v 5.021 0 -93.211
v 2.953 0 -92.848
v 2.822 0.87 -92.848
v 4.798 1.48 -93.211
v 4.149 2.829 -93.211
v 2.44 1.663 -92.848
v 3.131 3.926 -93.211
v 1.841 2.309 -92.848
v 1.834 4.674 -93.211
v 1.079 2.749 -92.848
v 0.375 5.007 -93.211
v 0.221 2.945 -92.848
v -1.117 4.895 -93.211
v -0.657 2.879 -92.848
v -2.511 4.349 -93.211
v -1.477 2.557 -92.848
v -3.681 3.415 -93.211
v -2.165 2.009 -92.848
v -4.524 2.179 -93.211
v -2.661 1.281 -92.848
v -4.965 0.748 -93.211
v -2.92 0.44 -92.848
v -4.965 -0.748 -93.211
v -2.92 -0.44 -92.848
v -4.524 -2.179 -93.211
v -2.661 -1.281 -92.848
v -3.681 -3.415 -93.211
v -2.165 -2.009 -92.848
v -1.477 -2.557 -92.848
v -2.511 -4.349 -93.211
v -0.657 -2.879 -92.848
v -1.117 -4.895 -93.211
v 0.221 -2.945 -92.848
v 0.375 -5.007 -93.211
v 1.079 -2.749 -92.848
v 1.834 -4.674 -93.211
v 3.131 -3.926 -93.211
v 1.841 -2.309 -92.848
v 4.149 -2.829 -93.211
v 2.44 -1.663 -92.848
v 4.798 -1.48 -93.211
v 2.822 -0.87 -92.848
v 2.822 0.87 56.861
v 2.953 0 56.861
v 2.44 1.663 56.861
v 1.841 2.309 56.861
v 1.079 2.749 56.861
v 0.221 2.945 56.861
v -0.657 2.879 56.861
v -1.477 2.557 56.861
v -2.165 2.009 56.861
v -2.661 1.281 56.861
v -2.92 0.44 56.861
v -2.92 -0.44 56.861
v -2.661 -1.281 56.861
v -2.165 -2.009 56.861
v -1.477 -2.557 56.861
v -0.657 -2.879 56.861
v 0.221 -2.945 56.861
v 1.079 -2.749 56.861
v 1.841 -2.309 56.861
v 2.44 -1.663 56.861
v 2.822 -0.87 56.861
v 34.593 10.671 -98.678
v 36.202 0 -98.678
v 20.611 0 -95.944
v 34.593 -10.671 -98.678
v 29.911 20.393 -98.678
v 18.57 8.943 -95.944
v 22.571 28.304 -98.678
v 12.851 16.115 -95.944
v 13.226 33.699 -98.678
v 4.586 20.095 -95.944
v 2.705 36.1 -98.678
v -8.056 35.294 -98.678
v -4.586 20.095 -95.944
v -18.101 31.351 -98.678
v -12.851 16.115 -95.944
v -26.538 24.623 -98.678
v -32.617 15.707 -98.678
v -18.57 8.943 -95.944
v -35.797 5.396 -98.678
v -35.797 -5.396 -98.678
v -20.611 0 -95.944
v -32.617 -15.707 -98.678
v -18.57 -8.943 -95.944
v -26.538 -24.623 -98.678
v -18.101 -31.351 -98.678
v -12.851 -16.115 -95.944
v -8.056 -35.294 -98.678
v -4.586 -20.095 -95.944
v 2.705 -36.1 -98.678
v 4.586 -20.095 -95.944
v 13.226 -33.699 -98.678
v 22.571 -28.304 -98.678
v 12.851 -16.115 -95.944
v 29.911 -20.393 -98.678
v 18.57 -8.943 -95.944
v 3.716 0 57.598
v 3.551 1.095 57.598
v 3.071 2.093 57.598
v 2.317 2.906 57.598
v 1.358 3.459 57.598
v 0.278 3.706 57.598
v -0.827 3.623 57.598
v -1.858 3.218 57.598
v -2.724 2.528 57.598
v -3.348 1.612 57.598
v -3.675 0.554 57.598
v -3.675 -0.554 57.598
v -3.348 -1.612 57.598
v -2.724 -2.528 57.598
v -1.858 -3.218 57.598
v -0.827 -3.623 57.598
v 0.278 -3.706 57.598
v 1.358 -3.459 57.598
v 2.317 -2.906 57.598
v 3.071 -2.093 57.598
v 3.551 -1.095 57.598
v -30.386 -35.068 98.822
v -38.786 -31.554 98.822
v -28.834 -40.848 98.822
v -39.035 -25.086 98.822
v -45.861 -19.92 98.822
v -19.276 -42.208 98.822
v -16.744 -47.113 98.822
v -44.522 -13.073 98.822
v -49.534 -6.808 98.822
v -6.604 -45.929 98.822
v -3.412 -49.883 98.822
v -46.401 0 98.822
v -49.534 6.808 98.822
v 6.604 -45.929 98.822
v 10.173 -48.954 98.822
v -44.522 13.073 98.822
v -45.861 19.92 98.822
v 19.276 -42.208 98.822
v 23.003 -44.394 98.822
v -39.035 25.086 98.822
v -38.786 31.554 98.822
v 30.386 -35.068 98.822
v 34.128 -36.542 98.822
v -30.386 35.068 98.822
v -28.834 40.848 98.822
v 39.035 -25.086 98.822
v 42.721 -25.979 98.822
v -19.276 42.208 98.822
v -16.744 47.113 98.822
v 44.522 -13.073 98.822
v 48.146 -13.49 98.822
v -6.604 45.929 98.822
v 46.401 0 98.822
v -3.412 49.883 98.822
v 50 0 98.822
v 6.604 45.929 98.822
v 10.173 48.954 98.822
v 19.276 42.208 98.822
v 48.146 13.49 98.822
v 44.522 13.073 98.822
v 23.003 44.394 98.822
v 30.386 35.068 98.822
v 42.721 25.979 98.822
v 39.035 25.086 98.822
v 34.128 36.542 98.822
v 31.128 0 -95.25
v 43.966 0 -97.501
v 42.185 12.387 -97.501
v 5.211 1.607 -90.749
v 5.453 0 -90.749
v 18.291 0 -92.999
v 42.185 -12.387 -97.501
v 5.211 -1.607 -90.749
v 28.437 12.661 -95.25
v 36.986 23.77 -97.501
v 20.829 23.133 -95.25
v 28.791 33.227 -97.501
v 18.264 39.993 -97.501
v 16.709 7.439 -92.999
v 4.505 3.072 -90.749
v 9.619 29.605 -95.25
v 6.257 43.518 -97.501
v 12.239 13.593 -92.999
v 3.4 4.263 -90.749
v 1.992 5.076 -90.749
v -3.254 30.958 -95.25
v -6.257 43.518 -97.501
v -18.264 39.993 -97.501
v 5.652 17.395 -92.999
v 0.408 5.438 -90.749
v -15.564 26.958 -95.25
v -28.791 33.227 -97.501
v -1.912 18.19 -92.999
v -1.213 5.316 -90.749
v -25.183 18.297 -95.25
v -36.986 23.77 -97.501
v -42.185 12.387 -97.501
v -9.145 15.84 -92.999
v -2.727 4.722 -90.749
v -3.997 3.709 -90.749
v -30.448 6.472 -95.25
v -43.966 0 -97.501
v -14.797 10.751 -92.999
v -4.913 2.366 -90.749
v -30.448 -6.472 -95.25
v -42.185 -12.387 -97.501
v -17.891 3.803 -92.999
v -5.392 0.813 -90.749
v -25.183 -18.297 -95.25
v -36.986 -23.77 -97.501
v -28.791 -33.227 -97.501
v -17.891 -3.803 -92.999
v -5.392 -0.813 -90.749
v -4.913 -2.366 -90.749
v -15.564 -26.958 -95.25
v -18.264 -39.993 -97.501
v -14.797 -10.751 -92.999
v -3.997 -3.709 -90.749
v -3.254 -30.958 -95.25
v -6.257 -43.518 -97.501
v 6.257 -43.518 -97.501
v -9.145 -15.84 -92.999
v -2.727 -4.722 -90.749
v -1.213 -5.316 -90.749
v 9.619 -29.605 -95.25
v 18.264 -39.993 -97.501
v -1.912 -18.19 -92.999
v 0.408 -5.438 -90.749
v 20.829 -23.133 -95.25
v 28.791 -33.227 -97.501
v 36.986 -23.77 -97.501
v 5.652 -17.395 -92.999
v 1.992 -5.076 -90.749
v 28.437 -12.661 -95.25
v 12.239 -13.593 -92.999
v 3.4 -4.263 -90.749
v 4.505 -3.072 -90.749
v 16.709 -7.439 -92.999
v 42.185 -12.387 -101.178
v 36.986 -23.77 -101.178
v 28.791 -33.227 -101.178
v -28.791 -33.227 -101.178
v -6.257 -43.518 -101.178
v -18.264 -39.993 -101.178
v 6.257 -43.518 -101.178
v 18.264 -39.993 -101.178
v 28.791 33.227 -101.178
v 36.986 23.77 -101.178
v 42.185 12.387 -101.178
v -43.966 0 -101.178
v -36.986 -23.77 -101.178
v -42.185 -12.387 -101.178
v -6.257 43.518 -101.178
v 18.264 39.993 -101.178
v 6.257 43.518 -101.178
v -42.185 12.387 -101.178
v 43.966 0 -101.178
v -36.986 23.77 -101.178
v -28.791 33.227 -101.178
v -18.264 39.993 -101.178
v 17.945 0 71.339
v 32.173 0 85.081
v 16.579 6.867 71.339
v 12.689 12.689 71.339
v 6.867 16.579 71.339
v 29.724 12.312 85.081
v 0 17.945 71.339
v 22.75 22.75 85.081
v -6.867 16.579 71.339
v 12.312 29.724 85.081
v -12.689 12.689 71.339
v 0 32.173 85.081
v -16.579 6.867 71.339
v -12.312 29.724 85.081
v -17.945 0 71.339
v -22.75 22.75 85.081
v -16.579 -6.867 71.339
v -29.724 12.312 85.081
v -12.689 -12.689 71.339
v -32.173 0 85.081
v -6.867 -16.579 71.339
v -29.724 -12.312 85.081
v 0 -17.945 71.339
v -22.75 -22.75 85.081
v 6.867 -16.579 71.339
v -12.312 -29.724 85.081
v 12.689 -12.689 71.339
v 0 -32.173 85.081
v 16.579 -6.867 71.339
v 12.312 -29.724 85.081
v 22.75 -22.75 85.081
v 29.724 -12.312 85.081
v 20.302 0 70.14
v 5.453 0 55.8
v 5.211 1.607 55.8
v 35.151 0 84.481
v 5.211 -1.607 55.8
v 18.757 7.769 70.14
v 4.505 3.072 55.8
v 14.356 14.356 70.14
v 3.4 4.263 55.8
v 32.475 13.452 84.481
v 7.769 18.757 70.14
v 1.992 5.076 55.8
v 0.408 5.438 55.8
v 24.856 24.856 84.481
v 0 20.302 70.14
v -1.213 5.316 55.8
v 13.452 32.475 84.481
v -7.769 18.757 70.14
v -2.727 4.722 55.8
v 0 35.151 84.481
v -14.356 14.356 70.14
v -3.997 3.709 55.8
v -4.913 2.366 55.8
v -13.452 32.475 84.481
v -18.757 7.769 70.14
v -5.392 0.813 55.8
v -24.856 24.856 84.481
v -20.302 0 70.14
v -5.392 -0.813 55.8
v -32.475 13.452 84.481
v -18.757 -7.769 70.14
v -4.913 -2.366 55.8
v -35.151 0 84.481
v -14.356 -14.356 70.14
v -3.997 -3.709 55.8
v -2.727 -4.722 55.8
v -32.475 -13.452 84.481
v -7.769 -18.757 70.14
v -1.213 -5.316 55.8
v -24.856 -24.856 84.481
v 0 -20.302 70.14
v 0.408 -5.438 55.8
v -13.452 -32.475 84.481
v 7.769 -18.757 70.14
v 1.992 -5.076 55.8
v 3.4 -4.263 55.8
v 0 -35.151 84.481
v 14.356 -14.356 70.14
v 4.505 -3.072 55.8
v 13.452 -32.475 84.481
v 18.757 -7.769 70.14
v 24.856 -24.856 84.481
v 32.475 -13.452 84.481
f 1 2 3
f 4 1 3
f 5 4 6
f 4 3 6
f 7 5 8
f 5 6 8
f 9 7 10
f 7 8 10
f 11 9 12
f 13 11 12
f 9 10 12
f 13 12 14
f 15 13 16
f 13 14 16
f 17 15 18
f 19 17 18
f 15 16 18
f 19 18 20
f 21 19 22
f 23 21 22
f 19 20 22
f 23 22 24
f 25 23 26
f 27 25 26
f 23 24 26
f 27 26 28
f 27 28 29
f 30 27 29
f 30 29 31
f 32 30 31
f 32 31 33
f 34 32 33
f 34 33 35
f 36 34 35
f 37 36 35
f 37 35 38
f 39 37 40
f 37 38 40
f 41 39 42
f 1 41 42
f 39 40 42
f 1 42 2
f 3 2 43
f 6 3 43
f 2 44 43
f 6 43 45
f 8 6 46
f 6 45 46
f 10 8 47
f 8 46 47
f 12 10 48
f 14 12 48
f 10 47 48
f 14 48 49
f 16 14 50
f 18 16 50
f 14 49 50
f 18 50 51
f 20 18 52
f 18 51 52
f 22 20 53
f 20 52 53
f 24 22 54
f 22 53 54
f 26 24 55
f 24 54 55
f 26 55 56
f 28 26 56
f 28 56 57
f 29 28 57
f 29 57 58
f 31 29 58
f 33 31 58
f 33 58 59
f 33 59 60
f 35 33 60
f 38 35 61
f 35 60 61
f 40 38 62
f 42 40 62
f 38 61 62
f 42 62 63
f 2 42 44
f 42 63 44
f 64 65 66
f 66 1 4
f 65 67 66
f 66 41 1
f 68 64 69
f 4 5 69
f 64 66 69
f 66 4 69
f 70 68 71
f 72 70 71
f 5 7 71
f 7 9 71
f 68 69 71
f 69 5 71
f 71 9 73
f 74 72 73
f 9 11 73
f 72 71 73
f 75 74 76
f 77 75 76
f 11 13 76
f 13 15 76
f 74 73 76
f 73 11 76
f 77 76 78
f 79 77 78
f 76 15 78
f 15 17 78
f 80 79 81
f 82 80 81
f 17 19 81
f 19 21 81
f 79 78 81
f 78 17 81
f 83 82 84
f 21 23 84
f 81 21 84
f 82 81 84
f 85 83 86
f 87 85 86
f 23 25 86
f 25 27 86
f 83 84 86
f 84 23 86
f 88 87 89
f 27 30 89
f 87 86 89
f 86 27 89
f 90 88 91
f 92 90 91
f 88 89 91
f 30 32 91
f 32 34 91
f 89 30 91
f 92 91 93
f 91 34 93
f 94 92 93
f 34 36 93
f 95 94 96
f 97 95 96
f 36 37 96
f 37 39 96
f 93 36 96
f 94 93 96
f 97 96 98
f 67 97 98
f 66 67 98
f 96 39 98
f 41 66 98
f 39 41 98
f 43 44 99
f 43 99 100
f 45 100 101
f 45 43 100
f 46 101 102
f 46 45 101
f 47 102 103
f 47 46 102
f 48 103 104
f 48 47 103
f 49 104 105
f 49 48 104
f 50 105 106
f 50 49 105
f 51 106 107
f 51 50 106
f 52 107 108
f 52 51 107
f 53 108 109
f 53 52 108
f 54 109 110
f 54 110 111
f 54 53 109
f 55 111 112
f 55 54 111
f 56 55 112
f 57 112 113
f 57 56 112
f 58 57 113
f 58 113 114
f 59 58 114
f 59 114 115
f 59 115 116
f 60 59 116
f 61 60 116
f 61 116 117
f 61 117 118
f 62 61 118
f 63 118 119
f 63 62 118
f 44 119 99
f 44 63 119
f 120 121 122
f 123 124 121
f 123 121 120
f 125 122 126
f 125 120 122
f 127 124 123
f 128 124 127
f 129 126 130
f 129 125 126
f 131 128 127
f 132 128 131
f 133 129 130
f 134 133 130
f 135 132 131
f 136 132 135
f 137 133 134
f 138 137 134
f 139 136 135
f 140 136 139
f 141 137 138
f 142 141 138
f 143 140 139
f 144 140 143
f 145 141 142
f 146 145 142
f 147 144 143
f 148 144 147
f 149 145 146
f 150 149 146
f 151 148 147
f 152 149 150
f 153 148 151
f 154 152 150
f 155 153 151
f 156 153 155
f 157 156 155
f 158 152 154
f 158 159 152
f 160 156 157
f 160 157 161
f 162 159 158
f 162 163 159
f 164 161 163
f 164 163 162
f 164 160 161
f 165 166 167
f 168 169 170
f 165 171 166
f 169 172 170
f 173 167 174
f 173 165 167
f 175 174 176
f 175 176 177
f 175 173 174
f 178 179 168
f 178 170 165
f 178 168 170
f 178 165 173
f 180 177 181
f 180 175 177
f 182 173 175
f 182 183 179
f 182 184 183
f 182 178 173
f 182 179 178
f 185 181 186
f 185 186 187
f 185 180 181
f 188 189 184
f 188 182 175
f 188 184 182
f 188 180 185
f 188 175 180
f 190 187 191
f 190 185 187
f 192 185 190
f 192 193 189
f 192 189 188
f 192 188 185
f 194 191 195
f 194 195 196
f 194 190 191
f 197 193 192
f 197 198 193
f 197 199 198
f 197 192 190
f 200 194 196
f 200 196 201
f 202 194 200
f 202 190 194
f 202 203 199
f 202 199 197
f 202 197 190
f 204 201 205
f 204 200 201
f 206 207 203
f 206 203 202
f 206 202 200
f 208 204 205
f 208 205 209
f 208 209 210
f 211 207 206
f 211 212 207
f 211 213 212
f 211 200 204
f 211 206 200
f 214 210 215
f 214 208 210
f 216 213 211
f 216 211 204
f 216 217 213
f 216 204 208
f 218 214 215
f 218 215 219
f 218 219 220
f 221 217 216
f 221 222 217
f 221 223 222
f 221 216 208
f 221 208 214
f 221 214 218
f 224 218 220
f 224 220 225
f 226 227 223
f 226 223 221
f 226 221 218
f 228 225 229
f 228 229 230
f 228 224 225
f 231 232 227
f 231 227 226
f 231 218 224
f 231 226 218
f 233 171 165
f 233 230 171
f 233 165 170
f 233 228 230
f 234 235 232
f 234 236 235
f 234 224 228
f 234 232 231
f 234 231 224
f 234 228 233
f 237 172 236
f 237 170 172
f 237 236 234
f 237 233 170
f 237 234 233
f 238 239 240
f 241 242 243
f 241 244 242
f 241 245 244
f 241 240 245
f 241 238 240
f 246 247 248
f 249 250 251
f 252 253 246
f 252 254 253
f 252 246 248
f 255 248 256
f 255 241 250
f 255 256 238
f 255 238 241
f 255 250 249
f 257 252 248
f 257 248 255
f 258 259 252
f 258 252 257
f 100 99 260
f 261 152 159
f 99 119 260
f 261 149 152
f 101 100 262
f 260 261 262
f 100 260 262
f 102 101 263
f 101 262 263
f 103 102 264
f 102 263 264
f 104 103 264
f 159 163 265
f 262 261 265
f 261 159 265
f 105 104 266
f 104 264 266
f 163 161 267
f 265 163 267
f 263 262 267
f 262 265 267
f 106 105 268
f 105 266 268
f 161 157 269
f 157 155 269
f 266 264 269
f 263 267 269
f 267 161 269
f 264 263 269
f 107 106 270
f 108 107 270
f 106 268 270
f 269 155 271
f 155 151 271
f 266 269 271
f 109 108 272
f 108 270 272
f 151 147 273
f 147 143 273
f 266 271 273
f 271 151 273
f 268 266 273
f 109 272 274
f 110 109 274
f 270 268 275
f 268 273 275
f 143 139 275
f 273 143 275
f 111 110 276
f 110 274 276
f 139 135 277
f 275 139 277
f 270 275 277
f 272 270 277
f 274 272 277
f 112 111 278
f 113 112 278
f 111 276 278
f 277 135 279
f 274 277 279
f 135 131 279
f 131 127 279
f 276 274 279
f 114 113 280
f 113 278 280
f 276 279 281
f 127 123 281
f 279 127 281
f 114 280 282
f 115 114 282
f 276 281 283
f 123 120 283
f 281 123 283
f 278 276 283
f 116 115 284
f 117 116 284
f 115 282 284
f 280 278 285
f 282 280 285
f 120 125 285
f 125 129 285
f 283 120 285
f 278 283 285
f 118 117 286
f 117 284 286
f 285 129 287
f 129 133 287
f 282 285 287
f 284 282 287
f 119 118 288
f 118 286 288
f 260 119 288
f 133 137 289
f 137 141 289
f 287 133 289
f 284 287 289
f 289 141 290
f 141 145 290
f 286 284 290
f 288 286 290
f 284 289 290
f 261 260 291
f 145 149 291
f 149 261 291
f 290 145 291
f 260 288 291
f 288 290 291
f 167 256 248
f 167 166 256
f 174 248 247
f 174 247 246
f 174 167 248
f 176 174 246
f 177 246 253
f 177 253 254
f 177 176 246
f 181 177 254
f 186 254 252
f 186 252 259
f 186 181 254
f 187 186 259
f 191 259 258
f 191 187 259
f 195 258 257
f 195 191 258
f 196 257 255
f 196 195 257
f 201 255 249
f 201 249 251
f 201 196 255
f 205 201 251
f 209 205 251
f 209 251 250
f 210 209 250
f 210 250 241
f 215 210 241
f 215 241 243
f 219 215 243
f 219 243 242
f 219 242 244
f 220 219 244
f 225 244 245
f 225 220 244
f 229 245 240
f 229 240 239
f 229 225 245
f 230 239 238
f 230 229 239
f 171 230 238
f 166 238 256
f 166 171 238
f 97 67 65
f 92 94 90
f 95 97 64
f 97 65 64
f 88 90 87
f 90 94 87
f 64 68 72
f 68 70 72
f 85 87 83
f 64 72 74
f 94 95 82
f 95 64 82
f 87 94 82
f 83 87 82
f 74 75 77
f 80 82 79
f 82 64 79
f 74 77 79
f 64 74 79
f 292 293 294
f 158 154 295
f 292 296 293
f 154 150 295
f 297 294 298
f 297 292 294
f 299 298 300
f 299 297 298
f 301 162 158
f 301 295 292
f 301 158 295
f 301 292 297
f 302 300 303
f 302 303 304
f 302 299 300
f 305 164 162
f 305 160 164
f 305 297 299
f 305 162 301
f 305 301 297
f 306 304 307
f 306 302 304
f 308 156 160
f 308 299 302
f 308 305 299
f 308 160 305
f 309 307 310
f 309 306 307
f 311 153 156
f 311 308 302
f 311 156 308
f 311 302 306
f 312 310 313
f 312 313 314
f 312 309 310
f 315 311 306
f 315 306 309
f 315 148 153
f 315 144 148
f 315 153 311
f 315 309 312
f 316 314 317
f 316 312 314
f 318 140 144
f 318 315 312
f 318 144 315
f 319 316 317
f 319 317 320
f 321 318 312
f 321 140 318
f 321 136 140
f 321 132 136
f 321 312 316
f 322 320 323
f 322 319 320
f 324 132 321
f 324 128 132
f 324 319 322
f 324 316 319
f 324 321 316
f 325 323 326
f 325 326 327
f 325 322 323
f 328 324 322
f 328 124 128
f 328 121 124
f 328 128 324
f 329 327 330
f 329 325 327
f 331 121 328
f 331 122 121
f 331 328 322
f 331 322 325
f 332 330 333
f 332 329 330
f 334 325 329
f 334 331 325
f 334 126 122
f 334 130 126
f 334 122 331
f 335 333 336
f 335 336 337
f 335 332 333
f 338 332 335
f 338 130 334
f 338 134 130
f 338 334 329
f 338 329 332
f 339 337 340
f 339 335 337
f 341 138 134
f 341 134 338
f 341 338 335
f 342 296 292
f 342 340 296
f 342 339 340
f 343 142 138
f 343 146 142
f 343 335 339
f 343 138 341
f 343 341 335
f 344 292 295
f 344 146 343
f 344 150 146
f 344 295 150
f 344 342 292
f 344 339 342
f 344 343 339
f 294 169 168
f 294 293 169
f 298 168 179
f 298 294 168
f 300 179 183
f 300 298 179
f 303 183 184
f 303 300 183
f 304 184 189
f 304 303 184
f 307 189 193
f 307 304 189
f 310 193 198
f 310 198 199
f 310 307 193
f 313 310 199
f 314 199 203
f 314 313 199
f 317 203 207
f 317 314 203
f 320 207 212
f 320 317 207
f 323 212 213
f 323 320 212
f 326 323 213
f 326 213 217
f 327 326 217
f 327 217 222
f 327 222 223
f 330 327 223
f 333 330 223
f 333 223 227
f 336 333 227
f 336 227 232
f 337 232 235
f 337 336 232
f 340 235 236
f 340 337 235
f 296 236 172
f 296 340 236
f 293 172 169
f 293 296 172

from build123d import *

# Parameters (mm, degrees)
F2_T = 2.5


# Not quite as in the source:
# - a shell that OpenCascade refuses in one call is made with other operations: the cavity is built on its own and cut out


with BuildPart() as f1:
    # F0 (on Front) → F1 (revolve)
    with BuildSketch(Plane.XZ):
        Polygon((0, 98.8223368999), (0, -101.1776631001), (43.9656563103, -101.1776631001), (43.9656563103, -97.5007638335), (5.4530212656, -90.7485485077), (5.4530212656, 55.7995252311), (50, 98.8223368999), align=None)
    revolve(axis=Axis((0, 0, -1.1776631001), (0, 0, 1)))

    # F2: shell of thickness 2.5, made by hand


with BuildPart() as f2_core1:
    # F2_t2: copy of F1
    add(f1.part)

    # the walls: a layer under each face that stays
    f2_faces = [f2_core1.faces().sort_by_distance(p)[0] for p in [
        (-27.7265106328, 0, 77.3109310655),
        (0, 0, -101.1776631001),
        (-43.9656563103, 0, -99.3392134668),
        (-24.7093387879, 0, -94.1246561706),
        (-5.4530212656, 0, -17.4745116383),
    ]]
    thicken(f2_faces, amount=-F2_T, mode=Mode.SUBTRACT)

    # F2_s3 → F2_t4 (revolve, cut)
    with BuildSketch(Plane.XZ):
        Polygon((5.4953886218, 55.7815426024), (3.7162856398, 57.5977881058), (2.9530212656, 56.8606386882), (2.9530212656, 55.7995252311), align=None)
    revolve(axis=Axis((0, 0, 55.7995252311), (0, 0, 1)), mode=Mode.SUBTRACT)

    # F2_s5 → F2_t6 (revolve, cut)
    with BuildSketch(Plane.XZ):
        Polygon((5.4823385311, -90.7239241048), (5.0212947153, -93.2109887985), (2.9530212656, -92.8483694226), (2.9530212656, -90.7485485077), align=None)
    revolve(axis=Axis((0, 0, -90.7485485077), (0, 0, 1)), mode=Mode.SUBTRACT)


with BuildPart() as f1_1:
    add(f1.part)

    # what is left inside the walls is the cavity
    f2_cavity = [f2_core1.part.solids().sort_by_distance(p)[0] for p in [
        (-17.927255, 0, 71.357287),
    ]]
    add(f2_cavity, mode=Mode.SUBTRACT)


solid = f1_1.part
